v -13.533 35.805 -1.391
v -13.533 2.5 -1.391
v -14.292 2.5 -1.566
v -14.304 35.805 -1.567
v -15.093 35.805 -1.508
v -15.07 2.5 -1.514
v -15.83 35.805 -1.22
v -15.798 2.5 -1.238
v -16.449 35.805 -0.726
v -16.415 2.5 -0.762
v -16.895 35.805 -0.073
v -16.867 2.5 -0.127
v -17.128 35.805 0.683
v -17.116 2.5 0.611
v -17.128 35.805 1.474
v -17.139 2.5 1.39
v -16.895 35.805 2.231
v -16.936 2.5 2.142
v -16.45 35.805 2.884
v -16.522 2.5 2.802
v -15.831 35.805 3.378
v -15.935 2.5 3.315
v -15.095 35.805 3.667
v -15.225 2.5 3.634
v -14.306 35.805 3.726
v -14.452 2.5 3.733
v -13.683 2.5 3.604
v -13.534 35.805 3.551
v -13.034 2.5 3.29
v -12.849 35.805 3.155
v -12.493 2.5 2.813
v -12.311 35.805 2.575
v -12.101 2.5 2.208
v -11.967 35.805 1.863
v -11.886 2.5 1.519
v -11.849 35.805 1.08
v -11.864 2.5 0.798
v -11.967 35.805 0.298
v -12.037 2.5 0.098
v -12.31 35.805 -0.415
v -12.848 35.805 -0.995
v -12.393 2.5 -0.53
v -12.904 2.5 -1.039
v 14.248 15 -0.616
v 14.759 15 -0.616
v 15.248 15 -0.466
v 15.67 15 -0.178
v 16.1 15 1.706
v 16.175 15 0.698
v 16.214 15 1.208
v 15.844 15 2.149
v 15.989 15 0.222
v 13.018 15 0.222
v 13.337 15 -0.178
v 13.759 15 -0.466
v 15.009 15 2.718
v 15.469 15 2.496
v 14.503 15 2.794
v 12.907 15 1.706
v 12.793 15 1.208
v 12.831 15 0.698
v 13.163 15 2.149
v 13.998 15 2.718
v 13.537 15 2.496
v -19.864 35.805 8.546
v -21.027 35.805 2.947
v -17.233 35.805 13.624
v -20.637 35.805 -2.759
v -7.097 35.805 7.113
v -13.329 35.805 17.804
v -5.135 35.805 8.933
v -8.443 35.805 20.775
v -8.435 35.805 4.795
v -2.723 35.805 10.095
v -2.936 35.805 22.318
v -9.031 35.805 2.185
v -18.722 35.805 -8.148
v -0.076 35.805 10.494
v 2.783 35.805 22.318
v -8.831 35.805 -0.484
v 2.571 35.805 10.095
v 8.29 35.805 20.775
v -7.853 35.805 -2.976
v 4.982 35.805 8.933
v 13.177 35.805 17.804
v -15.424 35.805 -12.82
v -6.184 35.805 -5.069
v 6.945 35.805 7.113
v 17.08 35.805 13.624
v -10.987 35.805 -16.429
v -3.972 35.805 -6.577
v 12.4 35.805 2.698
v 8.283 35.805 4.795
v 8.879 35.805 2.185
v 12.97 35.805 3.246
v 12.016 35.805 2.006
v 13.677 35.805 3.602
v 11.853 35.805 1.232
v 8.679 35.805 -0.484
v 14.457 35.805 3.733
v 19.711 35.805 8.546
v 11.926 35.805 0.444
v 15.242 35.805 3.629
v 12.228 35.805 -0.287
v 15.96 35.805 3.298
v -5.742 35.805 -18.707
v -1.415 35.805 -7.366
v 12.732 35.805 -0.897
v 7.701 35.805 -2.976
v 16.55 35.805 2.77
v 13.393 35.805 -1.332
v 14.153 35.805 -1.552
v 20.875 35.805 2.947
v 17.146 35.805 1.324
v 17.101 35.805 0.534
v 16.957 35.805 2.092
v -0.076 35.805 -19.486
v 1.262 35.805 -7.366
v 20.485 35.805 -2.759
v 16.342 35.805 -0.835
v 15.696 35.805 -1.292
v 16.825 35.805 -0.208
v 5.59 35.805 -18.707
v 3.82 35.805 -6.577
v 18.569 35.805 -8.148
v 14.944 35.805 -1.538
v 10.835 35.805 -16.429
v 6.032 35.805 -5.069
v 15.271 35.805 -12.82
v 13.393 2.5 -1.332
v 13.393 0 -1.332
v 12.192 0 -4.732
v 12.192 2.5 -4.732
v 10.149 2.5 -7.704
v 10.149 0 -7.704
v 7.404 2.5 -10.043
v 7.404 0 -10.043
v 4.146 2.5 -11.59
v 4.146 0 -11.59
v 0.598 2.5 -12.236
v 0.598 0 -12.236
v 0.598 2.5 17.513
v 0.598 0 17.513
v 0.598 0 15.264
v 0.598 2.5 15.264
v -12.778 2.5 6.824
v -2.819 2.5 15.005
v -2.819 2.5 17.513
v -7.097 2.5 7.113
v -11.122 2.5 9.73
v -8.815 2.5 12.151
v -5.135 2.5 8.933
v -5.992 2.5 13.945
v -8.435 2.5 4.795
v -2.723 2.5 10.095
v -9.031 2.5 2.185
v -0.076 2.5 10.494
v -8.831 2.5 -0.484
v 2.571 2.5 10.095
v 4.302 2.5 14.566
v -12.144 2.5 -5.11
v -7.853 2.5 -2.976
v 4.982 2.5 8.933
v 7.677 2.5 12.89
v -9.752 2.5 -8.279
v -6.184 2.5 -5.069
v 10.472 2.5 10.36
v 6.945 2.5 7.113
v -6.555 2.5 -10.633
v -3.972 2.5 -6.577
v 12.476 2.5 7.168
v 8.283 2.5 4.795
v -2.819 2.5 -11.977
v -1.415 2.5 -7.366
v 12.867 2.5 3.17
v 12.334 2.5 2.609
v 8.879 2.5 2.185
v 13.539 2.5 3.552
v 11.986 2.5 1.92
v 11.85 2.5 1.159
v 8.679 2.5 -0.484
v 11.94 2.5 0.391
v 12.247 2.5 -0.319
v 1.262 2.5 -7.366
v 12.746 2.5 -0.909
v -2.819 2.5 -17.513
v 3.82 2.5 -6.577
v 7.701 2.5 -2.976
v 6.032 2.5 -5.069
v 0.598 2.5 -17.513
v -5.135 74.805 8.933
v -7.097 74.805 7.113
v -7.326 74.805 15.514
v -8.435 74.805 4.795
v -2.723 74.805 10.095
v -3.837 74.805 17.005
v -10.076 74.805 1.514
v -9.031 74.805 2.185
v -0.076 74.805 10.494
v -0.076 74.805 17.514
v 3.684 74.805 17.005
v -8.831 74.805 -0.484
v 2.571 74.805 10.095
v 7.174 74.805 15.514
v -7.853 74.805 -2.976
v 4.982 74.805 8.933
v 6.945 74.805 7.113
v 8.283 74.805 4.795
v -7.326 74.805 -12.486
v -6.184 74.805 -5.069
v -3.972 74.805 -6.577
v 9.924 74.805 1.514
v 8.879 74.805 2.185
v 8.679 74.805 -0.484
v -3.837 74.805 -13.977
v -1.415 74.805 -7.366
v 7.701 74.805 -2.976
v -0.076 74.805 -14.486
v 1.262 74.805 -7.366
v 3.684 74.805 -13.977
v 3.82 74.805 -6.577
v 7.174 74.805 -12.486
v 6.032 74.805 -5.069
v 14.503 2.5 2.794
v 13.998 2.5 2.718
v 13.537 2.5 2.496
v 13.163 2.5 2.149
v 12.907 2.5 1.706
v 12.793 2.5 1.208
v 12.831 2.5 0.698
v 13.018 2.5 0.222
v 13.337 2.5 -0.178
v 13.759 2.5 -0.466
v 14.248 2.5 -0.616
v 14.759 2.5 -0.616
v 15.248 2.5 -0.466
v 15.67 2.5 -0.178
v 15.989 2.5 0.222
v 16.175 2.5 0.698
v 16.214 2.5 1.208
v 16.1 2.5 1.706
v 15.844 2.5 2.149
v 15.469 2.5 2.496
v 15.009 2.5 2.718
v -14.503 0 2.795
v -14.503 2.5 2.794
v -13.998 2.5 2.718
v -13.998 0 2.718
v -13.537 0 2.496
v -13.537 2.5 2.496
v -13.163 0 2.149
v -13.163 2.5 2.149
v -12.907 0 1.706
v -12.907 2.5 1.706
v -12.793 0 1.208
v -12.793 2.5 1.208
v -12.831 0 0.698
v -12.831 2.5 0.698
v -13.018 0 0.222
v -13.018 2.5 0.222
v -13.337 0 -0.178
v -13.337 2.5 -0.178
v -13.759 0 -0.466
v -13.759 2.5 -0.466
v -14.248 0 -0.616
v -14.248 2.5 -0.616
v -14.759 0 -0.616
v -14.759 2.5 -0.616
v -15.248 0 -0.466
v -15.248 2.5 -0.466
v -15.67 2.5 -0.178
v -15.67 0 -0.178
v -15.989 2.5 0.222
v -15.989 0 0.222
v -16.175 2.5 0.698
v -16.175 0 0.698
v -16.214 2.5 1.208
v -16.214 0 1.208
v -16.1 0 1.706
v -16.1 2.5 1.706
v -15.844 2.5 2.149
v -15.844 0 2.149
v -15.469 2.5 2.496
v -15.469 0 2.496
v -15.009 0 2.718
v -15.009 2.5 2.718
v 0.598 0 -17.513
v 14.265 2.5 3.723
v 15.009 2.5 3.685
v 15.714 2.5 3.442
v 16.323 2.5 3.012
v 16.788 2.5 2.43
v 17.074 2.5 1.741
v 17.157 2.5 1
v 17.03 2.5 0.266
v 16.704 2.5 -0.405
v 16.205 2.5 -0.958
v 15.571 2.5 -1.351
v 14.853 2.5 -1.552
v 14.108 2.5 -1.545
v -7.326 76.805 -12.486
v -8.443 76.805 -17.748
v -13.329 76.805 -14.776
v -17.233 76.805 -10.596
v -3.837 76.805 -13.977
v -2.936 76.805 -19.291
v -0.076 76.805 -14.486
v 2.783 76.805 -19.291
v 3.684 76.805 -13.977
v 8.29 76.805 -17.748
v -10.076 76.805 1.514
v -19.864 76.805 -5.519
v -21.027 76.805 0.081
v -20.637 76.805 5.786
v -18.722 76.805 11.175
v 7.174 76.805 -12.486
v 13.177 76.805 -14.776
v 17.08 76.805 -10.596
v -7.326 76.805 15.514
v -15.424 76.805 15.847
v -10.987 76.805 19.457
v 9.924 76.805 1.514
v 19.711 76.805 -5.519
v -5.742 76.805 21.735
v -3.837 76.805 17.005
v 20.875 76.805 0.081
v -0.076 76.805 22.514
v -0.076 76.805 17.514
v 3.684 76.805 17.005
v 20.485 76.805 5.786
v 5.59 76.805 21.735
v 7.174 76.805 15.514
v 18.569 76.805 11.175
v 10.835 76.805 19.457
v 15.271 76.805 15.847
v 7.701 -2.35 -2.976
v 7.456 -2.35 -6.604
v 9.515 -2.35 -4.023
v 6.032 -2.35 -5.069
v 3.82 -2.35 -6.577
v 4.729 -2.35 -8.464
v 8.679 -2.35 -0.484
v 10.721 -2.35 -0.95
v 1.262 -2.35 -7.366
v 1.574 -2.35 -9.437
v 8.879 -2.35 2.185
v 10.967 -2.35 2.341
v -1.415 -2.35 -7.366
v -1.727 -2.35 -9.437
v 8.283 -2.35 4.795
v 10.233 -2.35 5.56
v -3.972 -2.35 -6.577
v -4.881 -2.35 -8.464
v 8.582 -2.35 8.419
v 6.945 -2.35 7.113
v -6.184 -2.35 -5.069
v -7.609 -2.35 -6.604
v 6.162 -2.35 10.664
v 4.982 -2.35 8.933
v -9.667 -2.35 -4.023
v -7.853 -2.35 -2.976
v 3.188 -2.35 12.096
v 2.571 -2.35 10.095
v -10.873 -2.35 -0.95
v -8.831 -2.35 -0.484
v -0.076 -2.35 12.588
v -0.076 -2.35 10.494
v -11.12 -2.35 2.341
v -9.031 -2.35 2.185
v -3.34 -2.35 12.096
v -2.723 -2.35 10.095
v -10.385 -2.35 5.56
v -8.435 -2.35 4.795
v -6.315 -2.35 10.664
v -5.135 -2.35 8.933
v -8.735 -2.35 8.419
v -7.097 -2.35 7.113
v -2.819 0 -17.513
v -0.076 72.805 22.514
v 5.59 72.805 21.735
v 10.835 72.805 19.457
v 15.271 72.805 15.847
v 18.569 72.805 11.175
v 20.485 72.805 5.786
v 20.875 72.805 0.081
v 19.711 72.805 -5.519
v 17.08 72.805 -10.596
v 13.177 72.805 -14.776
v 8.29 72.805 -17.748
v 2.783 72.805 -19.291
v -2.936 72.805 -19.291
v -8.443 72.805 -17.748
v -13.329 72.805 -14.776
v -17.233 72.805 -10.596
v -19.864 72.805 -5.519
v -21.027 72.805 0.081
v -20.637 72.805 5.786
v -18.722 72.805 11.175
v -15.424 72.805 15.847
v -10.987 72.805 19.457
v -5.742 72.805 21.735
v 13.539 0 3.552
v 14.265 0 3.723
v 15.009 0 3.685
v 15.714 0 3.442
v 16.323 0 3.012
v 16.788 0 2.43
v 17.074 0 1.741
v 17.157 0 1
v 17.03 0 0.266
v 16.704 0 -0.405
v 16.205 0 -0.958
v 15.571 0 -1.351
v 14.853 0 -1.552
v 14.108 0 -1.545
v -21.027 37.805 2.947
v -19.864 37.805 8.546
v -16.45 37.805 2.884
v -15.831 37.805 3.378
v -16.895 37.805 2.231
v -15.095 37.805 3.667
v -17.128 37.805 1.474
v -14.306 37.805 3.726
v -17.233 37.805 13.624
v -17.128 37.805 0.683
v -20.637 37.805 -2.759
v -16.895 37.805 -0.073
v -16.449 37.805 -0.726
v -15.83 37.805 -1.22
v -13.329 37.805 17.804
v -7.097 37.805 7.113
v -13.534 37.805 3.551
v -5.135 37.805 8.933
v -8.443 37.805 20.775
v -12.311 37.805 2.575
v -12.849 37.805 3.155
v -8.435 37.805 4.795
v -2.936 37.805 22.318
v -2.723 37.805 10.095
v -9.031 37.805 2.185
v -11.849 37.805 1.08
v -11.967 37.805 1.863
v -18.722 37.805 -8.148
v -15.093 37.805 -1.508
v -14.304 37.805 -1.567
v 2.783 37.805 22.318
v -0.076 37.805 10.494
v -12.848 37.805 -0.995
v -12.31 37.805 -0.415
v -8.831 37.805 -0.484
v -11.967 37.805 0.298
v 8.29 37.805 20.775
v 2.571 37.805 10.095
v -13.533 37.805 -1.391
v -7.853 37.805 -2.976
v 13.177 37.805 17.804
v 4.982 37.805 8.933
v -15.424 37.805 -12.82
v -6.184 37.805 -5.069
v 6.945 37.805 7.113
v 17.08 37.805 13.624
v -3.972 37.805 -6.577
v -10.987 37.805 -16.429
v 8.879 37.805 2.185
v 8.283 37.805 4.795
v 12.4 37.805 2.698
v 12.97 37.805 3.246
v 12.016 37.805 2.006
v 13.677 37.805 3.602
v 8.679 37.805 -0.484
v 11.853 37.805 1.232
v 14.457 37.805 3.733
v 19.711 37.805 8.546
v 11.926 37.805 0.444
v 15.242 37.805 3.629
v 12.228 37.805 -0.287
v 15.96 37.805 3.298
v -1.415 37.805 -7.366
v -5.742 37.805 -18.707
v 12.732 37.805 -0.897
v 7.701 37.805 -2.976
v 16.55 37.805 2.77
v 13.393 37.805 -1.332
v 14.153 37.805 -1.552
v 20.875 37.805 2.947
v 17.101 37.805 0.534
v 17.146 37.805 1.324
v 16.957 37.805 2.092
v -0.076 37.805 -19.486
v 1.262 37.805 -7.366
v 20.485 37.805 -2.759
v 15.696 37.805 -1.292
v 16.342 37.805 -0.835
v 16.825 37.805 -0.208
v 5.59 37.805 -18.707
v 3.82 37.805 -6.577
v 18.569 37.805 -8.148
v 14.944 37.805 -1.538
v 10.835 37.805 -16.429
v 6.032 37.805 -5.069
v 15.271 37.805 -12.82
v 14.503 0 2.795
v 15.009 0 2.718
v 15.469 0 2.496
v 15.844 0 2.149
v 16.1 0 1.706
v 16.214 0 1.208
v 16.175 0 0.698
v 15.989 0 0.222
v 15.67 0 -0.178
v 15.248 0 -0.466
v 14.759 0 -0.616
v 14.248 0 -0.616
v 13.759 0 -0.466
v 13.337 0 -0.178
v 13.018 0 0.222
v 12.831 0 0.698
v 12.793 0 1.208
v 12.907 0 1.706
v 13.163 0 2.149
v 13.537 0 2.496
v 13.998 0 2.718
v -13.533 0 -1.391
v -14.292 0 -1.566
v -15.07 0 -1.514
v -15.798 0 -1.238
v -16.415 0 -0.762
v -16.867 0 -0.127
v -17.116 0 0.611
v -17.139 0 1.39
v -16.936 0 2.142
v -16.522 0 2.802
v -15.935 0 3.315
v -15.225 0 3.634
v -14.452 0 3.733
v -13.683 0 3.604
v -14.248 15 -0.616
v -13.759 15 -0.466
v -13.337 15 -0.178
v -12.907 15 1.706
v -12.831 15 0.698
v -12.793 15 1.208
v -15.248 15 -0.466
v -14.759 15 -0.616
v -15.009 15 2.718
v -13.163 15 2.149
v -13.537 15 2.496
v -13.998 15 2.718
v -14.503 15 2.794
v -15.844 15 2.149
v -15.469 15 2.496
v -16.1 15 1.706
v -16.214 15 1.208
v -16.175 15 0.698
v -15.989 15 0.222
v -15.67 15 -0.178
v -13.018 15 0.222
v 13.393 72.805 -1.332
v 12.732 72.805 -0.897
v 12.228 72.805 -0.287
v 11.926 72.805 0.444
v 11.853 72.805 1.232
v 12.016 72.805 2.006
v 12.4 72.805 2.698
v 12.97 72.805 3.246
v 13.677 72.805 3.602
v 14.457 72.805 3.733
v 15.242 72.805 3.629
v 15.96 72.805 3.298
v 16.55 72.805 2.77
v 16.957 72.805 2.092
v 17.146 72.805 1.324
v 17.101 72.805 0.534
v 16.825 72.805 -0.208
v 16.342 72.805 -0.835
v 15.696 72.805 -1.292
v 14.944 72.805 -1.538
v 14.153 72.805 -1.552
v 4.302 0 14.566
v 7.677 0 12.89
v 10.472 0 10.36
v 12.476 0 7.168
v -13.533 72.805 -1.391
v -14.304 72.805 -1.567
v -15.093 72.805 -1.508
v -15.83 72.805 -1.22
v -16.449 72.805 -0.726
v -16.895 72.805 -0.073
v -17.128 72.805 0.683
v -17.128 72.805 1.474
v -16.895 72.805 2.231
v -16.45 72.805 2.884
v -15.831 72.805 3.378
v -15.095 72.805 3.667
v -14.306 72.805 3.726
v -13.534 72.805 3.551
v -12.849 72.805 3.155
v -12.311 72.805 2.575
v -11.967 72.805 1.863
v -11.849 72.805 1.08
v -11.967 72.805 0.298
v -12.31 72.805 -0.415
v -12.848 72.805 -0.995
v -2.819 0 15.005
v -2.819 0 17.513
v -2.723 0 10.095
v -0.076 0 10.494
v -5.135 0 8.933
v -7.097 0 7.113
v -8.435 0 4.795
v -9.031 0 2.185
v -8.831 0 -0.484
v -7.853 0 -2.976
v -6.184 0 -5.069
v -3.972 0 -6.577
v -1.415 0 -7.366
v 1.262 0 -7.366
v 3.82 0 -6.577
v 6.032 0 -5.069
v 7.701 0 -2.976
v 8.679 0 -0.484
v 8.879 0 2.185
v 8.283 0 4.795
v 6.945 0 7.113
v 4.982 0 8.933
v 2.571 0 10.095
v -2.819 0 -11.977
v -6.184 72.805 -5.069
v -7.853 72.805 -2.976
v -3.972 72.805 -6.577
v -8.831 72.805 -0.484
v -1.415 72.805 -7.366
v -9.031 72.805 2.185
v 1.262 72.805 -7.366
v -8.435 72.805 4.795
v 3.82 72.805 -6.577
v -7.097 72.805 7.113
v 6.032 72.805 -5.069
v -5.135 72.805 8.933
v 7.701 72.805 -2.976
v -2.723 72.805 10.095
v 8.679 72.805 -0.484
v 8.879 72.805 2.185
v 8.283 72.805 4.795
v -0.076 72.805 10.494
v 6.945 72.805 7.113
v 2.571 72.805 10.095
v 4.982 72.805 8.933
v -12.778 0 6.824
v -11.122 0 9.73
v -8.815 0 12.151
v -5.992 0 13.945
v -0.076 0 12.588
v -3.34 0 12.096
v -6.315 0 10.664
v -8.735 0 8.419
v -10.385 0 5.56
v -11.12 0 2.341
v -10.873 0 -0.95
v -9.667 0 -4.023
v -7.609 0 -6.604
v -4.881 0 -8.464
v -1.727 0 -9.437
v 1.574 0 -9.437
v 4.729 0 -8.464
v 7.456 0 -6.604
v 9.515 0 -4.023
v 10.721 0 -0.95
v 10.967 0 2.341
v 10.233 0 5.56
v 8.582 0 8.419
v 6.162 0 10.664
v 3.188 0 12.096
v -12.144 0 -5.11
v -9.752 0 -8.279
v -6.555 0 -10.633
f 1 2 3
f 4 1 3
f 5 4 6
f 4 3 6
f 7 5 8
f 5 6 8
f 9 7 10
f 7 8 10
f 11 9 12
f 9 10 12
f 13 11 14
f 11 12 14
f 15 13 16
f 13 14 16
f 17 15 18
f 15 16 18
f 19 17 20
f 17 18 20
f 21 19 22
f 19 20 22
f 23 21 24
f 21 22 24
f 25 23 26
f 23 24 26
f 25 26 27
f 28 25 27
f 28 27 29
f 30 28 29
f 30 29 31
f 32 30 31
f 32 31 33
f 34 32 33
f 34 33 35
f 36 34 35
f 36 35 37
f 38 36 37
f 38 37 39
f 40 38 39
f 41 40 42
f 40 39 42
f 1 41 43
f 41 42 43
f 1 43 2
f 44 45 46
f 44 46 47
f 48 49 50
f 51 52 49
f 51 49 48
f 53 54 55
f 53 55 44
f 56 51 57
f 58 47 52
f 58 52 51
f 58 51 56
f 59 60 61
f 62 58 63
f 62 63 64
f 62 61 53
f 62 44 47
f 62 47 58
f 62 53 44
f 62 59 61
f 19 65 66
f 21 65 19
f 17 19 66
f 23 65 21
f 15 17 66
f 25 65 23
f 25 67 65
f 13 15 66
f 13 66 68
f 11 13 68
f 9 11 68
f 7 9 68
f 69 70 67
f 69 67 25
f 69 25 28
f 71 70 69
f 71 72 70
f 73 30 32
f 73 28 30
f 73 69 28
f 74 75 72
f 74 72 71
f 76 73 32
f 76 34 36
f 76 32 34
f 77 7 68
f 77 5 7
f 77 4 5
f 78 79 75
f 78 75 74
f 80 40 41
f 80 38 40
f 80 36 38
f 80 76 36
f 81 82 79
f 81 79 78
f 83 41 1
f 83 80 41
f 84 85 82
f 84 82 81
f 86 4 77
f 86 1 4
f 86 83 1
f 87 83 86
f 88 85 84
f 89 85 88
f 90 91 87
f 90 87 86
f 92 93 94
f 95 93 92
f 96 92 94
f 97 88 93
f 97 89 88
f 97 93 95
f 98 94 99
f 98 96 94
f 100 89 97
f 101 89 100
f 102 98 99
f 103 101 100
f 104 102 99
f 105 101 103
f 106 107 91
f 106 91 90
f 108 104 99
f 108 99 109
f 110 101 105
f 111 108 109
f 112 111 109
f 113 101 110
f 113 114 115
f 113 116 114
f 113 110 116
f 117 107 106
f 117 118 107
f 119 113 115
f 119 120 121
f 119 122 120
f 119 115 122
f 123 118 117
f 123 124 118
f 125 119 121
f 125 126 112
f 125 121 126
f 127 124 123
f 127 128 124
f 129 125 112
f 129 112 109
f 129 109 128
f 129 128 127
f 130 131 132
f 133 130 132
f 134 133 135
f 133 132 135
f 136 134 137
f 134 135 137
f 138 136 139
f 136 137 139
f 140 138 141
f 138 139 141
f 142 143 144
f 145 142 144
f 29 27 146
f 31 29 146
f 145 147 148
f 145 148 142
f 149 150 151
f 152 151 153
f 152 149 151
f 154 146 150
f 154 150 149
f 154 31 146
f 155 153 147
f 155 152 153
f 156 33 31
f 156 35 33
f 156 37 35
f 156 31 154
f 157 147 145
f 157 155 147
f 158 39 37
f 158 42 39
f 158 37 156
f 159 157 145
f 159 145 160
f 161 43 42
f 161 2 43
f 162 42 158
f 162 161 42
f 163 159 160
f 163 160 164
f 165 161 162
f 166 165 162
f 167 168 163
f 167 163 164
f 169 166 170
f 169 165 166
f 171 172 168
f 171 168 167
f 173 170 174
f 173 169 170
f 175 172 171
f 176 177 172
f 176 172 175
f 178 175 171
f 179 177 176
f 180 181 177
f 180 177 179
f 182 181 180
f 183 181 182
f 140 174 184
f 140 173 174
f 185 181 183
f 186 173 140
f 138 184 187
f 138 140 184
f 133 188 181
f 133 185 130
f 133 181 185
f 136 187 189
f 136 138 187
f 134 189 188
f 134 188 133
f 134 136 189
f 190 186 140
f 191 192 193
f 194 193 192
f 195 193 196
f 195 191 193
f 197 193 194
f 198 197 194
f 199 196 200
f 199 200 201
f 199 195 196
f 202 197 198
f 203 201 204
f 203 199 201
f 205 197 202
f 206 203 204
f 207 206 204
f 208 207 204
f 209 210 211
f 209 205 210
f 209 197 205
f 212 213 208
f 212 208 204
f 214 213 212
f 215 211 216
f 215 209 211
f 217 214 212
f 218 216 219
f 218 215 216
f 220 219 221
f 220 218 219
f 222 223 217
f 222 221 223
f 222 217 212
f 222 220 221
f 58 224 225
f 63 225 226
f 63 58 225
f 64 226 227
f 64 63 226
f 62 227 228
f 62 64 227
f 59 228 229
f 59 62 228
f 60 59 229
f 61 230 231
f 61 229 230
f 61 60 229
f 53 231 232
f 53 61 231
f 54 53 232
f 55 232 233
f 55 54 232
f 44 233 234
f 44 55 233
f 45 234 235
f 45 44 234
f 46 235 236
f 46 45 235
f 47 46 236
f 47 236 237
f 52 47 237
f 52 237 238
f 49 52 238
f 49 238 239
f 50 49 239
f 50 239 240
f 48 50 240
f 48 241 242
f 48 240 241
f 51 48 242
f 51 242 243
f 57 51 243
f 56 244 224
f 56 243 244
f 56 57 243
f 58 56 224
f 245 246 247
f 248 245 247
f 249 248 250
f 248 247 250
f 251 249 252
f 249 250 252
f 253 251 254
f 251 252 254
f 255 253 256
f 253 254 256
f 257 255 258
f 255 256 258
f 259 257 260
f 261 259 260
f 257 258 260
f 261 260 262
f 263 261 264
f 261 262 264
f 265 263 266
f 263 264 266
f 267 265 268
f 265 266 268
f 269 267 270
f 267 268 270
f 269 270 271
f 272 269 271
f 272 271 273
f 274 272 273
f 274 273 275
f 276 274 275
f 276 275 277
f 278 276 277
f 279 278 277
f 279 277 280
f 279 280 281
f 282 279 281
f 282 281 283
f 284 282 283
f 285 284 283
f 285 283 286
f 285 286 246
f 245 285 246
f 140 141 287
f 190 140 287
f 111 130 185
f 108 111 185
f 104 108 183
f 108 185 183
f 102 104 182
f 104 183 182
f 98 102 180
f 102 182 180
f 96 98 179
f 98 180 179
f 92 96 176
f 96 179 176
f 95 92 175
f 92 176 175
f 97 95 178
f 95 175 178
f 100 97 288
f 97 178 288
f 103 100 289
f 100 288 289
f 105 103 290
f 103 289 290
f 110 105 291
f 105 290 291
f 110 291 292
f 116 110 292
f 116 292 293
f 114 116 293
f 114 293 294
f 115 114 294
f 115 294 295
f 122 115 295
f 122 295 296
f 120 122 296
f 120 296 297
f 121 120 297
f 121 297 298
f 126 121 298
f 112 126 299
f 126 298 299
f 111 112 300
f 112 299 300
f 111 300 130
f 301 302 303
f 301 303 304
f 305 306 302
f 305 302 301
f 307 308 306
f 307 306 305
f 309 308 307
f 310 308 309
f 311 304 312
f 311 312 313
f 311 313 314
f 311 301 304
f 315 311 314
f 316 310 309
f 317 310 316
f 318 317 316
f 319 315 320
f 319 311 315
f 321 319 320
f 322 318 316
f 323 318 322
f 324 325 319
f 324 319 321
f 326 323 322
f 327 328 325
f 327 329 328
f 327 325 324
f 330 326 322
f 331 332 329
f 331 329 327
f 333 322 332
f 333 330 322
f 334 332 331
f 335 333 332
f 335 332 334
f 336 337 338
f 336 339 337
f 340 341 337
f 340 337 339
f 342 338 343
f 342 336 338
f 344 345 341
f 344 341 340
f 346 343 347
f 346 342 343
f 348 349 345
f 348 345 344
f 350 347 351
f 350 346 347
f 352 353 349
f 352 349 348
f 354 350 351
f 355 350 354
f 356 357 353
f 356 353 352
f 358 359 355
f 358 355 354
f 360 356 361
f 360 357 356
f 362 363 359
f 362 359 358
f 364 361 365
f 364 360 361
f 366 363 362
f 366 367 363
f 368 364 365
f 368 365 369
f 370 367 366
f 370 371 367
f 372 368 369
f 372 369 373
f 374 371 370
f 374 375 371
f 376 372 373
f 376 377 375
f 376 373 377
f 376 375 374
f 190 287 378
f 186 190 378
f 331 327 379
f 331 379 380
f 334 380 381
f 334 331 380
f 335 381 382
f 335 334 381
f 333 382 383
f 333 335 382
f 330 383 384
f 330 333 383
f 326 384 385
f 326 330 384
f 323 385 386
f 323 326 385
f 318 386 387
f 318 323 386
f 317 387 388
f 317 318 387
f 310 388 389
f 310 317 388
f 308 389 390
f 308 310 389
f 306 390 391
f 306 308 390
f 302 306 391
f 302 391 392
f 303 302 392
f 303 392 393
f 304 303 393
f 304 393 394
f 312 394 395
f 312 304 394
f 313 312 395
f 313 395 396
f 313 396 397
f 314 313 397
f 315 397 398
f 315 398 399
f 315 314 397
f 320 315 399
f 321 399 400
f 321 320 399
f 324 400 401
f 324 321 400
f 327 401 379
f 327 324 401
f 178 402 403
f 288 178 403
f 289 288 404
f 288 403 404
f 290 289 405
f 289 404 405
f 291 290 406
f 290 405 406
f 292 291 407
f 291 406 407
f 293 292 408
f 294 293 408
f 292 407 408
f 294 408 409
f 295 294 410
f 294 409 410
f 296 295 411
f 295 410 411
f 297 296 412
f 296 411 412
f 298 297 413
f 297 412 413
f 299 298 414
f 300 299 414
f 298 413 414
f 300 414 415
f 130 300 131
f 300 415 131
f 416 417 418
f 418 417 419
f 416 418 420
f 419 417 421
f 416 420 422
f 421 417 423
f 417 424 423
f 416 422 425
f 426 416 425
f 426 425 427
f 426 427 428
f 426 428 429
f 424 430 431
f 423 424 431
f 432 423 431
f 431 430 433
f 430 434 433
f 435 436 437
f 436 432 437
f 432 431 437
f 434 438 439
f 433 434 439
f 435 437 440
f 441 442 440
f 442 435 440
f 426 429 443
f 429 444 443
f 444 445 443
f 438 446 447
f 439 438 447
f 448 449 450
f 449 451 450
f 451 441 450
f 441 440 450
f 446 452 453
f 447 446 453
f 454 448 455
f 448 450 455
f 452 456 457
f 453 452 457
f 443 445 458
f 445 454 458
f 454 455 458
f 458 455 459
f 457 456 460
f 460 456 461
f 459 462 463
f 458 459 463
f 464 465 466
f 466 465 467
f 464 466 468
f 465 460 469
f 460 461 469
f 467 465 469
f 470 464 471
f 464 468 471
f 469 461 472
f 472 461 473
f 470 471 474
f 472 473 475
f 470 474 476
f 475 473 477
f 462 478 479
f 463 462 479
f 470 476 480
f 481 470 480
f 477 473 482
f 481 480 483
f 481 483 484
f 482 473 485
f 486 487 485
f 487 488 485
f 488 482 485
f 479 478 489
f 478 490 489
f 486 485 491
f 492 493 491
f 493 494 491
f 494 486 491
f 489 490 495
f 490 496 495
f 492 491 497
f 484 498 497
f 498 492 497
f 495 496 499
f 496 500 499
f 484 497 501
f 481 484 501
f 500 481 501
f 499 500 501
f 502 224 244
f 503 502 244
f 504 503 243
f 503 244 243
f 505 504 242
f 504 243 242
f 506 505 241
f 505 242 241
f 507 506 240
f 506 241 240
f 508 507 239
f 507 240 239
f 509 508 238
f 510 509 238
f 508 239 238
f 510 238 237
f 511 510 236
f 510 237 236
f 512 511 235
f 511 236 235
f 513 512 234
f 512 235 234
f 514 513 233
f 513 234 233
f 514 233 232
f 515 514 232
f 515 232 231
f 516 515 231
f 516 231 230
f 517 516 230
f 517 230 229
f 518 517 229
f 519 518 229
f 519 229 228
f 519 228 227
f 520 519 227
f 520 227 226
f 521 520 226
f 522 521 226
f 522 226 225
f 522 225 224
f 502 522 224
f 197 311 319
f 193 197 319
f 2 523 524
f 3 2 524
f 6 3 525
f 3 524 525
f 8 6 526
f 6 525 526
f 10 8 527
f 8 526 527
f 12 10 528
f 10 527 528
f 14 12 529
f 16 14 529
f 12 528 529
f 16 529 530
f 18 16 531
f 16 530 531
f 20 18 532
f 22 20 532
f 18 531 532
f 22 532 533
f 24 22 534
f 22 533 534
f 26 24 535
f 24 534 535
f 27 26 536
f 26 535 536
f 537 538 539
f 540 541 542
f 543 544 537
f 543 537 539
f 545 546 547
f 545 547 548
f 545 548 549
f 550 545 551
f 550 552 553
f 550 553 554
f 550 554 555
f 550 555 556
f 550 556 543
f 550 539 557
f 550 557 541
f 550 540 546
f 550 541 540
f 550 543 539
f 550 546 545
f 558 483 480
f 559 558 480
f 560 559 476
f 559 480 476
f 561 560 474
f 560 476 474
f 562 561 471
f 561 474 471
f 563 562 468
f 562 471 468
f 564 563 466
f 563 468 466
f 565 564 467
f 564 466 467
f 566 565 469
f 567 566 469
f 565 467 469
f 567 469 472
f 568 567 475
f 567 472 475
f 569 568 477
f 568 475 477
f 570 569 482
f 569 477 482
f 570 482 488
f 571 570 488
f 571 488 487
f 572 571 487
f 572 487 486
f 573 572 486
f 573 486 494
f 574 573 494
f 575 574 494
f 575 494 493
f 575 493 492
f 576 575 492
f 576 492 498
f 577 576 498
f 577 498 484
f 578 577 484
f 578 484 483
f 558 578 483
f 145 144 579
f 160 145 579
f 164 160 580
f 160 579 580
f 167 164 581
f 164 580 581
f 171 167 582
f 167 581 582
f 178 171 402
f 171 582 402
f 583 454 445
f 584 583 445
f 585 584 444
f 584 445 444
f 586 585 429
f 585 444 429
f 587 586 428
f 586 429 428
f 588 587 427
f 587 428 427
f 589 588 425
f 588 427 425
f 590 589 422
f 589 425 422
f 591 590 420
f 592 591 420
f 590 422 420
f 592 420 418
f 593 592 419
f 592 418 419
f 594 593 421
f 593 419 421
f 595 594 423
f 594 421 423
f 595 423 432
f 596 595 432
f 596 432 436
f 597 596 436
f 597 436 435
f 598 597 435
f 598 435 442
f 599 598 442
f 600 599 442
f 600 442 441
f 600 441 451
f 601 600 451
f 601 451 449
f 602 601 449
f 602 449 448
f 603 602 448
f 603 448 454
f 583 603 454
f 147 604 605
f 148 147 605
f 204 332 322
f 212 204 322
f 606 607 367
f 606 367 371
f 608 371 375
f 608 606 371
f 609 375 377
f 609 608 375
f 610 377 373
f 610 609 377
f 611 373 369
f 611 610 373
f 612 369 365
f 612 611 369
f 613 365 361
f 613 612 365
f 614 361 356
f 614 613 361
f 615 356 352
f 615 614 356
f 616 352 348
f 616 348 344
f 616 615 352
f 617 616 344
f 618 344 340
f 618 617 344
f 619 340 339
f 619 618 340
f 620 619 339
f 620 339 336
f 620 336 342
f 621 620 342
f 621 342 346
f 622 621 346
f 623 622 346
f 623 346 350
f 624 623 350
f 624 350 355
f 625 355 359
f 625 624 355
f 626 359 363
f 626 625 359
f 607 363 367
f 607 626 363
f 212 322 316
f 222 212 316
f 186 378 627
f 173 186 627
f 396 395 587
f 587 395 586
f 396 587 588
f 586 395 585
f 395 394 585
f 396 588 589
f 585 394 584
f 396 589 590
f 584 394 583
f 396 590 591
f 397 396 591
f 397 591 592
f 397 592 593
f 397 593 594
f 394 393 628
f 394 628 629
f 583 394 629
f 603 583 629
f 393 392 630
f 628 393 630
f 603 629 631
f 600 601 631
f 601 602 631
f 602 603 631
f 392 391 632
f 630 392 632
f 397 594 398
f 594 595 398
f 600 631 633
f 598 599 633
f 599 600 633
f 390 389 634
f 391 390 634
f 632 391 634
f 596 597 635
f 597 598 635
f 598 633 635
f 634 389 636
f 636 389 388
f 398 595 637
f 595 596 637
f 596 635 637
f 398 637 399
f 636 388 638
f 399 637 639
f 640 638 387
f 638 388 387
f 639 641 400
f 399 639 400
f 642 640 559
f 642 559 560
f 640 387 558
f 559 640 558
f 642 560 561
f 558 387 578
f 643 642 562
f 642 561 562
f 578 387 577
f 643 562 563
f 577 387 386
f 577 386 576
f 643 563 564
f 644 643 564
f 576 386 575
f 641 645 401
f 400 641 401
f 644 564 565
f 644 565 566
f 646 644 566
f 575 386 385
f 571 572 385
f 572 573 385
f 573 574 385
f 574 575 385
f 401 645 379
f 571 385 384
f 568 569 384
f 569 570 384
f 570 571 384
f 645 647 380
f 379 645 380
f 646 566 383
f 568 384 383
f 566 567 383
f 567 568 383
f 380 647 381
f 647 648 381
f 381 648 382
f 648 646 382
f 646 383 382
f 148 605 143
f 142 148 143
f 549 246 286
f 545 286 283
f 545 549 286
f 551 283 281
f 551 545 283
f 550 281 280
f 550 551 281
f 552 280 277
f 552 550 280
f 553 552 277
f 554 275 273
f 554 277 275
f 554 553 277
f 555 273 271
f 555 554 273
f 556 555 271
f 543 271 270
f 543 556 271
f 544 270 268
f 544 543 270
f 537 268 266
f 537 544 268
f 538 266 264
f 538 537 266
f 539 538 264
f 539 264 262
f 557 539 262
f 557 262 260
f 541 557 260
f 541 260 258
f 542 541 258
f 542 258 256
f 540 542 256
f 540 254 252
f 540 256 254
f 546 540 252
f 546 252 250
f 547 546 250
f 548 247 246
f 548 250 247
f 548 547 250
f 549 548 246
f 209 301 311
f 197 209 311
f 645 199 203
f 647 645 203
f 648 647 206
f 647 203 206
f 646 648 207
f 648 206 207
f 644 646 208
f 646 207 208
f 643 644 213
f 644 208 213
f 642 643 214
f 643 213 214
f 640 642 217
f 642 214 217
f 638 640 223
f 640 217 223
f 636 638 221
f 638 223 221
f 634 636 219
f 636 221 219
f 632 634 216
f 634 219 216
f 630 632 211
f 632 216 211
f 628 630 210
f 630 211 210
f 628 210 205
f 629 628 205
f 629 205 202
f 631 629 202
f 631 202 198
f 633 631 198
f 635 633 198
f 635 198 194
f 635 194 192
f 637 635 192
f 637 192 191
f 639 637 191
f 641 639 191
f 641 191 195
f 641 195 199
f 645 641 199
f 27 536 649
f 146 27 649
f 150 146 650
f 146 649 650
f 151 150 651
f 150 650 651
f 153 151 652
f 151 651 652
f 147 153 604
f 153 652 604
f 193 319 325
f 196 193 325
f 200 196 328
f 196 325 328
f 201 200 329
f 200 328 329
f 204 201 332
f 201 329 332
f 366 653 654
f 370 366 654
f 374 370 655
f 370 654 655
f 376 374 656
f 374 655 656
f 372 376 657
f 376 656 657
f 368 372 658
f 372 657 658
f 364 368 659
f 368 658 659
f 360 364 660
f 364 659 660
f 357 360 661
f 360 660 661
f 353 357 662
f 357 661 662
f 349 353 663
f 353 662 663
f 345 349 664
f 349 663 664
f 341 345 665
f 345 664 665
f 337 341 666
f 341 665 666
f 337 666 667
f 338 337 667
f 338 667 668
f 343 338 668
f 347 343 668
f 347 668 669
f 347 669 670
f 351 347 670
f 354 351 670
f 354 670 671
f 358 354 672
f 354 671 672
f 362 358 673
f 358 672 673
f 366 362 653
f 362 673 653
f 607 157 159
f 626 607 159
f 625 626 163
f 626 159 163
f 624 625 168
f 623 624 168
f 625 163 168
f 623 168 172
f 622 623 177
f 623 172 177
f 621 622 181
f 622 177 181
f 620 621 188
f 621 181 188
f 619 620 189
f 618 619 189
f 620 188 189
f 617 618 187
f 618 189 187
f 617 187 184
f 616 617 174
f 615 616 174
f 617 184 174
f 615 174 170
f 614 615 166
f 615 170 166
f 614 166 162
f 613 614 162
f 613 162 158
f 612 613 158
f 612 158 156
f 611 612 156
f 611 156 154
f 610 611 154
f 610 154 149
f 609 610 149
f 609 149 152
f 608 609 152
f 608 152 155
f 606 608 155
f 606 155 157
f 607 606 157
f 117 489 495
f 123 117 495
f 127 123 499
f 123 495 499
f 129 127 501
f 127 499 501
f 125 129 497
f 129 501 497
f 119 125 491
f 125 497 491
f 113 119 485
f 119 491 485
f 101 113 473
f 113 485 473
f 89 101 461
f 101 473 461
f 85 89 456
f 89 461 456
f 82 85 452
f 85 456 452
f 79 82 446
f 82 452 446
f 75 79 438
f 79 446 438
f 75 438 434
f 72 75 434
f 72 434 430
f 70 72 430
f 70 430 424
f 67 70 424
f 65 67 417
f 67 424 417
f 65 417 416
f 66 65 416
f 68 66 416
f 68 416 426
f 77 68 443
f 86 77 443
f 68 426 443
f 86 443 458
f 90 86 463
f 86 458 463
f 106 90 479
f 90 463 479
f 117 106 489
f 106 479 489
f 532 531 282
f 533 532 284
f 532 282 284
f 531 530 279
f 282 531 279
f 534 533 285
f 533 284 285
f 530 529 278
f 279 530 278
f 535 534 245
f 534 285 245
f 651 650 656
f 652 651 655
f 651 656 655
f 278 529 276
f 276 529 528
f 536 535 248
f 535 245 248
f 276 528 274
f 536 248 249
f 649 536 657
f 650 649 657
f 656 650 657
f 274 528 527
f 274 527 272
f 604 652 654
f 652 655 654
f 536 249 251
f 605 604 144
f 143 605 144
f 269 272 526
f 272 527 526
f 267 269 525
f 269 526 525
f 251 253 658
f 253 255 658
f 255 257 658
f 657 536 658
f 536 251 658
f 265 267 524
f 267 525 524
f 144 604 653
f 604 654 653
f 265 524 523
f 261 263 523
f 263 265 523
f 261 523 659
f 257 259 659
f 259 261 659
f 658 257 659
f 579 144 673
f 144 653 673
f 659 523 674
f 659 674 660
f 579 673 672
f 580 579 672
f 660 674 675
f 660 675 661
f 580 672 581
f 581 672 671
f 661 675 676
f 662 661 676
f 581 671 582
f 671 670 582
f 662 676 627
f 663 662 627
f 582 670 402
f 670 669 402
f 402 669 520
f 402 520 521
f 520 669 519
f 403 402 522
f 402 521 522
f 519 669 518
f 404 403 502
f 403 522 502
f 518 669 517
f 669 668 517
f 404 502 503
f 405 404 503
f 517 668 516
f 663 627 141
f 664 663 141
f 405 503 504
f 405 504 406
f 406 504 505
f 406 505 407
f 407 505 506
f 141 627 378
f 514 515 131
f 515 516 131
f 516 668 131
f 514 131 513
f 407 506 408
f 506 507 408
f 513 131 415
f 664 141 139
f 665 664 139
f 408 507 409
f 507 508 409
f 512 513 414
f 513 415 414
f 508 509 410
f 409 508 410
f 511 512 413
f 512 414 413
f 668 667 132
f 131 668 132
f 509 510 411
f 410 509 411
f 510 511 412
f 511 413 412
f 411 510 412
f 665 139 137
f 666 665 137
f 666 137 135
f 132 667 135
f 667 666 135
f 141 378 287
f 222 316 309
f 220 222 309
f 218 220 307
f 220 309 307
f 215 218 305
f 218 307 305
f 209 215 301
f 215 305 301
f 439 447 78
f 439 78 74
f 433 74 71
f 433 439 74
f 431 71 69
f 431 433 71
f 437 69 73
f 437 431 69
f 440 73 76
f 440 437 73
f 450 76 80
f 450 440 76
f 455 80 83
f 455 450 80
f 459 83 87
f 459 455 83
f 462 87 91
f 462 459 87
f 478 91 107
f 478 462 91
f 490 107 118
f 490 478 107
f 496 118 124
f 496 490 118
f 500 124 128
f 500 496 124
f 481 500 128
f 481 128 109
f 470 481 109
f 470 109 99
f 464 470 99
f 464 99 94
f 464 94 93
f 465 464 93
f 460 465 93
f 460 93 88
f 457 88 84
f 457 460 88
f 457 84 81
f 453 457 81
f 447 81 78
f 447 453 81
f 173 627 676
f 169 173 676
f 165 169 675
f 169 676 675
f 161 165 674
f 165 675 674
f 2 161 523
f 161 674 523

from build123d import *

# Parameters (mm, degrees)
BOSS_EXTRUDE1_DEPTH = 2.5
CUT_EXTRUDE1_REACH  = 26.645
SKETCH2_R           = 1.715
SKETCH2_R_2         = 8.98
SKETCH3_R           = 2.6543
BOSS_EXTRUDE2_DEPTH = 70.305
BOSS_EXTRUDE3_START = 4
SKETCH4_R           = 21
SKETCH4_R_2         = 8.98
BOSS_EXTRUDE3_DEPTH = 4
SKETCH6_R           = 21
SKETCH6_R_2         = 8.98
BOSS_EXTRUDE4_DEPTH = 2
CUT_EXTRUDE3_START  = -15
SKETCH7_R           = 1.715
CUT_EXTRUDE3_DEPTH  = 15
SKETCH8_R           = 8.98
CUT_EXTRUDE4_DEPTH  = 2
SKETCH9_R           = 11.0744
SKETCH9_R_2         = 8.98
BOSS_EXTRUDE5_DEPTH = 2.35


with BuildPart() as part:
    # Sketch1 → Boss-Extrude1 (new body)
    with BuildSketch(Plane(origin=(0, 0, 0), x_dir=(1, 0, 0), z_dir=(0, 1, 0))):
        with BuildLine():
            Line((0.597960958, 12.236443242), (0.597960958, 17.5133))
            Line((0.597960958, 17.5133), (-2.819411684, 17.5133))
            Line((-2.819411684, 17.5133), (-2.819411684, 11.976881697))
            ThreePointArc((-2.819411684, 11.976881697), (-9.752212861, 8.278991937), (-13.533031252, 1.391065316))
            ThreePointArc((-13.533031252, 1.391065316), (-17.156497956, -0.999626805), (-13.683409812, -3.603965207))
            ThreePointArc((-13.683409812, -3.603965207), (-10.042516815, -11.01106651), (-2.819411684, -15.004561697))
            Line((-2.819411684, -15.004561697), (-2.819411684, -17.5133))
            Line((-2.819411684, -17.5133), (0.597960958, -17.5133))
            Line((0.597960958, -17.5133), (0.597960958, -15.264123242))
            ThreePointArc((0.597960958, -15.264123242), (9.161591247, -11.721092084), (13.538839655, -3.55233882))
            ThreePointArc((13.538839655, -3.55233882), (17.156522938, -1.000460972), (13.393344487, 1.331534062))
            ThreePointArc((13.393344487, 1.331534062), (8.853545908, 8.96396608), (0.597960958, 12.236443242))
        make_face()
    extrude(amount=BOSS_EXTRUDE1_DEPTH)

    # Sketch2 → Cut-Extrude1 (cut, up to next)
    with BuildSketch(Plane(origin=(0, 2.5, 0), x_dir=(1, 0, 0), z_dir=(0, 1, 0)), mode=Mode.PRIVATE) as cut_extrude1_sk1:
        with Locations(Location((-14.5034, -1.0795, 0), (0, 0, 270))):
            Circle(SKETCH2_R)
    cut_extrude1_tool1 = extrude(cut_extrude1_sk1.sketch, amount=-CUT_EXTRUDE1_REACH, mode=Mode.PRIVATE) & part.part
    # Sketch2 → Cut-Extrude1 (cut, up to next)
    with BuildSketch(Plane(origin=(0, 2.5, 0), x_dir=(1, 0, 0), z_dir=(0, 1, 0)), mode=Mode.PRIVATE) as cut_extrude1_sk2:
        with Locations(Location((14.5034, -1.0795, 0), (0, 0, 270))):
            Circle(SKETCH2_R)
    cut_extrude1_tool2 = extrude(cut_extrude1_sk2.sketch, amount=-CUT_EXTRUDE1_REACH, mode=Mode.PRIVATE) & part.part
    # Sketch2 → Cut-Extrude1 (cut, up to next)
    with BuildSketch(Plane(origin=(0, 2.5, 0), x_dir=(1, 0, 0), z_dir=(0, 1, 0)), mode=Mode.PRIVATE) as cut_extrude1_sk3:
        with Locations(Location((-0.0762, -1.51384, 0), (0, 0, 270))):
            Circle(SKETCH2_R_2)
    cut_extrude1_tool3 = extrude(cut_extrude1_sk3.sketch, amount=-CUT_EXTRUDE1_REACH, mode=Mode.PRIVATE) & part.part
    add(cut_extrude1_tool1.solids().sort_by_distance((-14.5034, 2.5, 1.0795))[0], mode=Mode.SUBTRACT)
    add(cut_extrude1_tool2.solids().sort_by_distance((14.5034, 2.5, 1.0795))[0], mode=Mode.SUBTRACT)
    add(cut_extrude1_tool3.solids().sort_by_distance((-0.0762, 2.5, 1.51384))[0], mode=Mode.SUBTRACT)

    # Sketch3 → Boss-Extrude2 (add)
    with BuildSketch(Plane(origin=(0, 2.5, 0), x_dir=(1, 0, 0), z_dir=(0, 1, 0))):
        with Locations(Location((-14.5034, -1.0795, 0), (0, 0, 68.556492541))):
            Circle(SKETCH3_R)
        with Locations(Location((14.5034, -1.0795, 0), (0, 0, 114.72164566))):
            Circle(SKETCH3_R)
    extrude(amount=BOSS_EXTRUDE2_DEPTH)

    # Sketch4 → Boss-Extrude3 (add)
    with BuildSketch(Plane(origin=(0, 72.805, 0), x_dir=(1, 0, 0), z_dir=(0, 1, 0)).offset(BOSS_EXTRUDE3_START)):
        with Locations(Location((-0.0762, -1.51384, 0), (0, 0, 270))):
            Circle(SKETCH4_R)
        with Locations(Location((-0.0762, -1.51384, 0), (0, 0, 270))):
            Circle(SKETCH4_R_2, mode=Mode.SUBTRACT)
    extrude(amount=-BOSS_EXTRUDE3_DEPTH)

    # Sketch6 → Boss-Extrude4 (add)
    with BuildSketch(Plane(origin=(0, 37.805, 0), x_dir=(-1, 0, 0), z_dir=(0, -1, 0))):
        with Locations(Location((0.0762, -1.51384, 0), (0, 0, 90))):
            Circle(SKETCH6_R)
        with Locations(Location((0.0762, -1.51384, 0), (0, 0, 270))):
            Circle(SKETCH6_R_2, mode=Mode.SUBTRACT)
    extrude(amount=BOSS_EXTRUDE4_DEPTH)

    # Sketch7 → Cut-Extrude3 (cut)
    with BuildSketch(Plane.XZ.offset(CUT_EXTRUDE3_START)):
        with Locations(Location((-14.5034, 1.0795, 0), (0, 0, 90))):
            Circle(SKETCH7_R)
        with Locations(Location((14.5034, 1.0795, 0), (0, 0, 90))):
            Circle(SKETCH7_R)
    extrude(amount=CUT_EXTRUDE3_DEPTH, mode=Mode.SUBTRACT)

    # Sketch8 → Cut-Extrude4 (cut)
    with BuildSketch(Plane(origin=(0, 76.805, 0), x_dir=(1, 0, 0), z_dir=(0, 1, 0))):
        with BuildLine():
            Line((-10.0762, -1.51384), (-7.3262, -15.51384))
            ThreePointArc((-7.3262, -15.51384), (-0.0762, -17.51384), (7.1738, -15.51384))
            Line((7.1738, -15.51384), (9.9238, -1.51384))
            Line((9.9238, -1.51384), (7.1738, 12.48616))
            ThreePointArc((7.1738, 12.48616), (-0.0762, 14.48616), (-7.3262, 12.48616))
            Line((-7.3262, 12.48616), (-10.0762, -1.51384))
        make_face()
        with Locations(Location((-0.0762, -1.51384, 0), (0, 0, 270))):
            Circle(SKETCH8_R, mode=Mode.SUBTRACT)
    extrude(amount=-CUT_EXTRUDE4_DEPTH, mode=Mode.SUBTRACT)

    # Sketch9 → Boss-Extrude5 (add)
    with BuildSketch(Plane.XZ):
        with Locations(Location((-0.0762, 1.51384, 0), (0, 0, 90))):
            Circle(SKETCH9_R)
        with Locations(Location((-0.0762, 1.51384, 0), (0, 0, 90))):
            Circle(SKETCH9_R_2, mode=Mode.SUBTRACT)
    extrude(amount=BOSS_EXTRUDE5_DEPTH)


solid = part.part
